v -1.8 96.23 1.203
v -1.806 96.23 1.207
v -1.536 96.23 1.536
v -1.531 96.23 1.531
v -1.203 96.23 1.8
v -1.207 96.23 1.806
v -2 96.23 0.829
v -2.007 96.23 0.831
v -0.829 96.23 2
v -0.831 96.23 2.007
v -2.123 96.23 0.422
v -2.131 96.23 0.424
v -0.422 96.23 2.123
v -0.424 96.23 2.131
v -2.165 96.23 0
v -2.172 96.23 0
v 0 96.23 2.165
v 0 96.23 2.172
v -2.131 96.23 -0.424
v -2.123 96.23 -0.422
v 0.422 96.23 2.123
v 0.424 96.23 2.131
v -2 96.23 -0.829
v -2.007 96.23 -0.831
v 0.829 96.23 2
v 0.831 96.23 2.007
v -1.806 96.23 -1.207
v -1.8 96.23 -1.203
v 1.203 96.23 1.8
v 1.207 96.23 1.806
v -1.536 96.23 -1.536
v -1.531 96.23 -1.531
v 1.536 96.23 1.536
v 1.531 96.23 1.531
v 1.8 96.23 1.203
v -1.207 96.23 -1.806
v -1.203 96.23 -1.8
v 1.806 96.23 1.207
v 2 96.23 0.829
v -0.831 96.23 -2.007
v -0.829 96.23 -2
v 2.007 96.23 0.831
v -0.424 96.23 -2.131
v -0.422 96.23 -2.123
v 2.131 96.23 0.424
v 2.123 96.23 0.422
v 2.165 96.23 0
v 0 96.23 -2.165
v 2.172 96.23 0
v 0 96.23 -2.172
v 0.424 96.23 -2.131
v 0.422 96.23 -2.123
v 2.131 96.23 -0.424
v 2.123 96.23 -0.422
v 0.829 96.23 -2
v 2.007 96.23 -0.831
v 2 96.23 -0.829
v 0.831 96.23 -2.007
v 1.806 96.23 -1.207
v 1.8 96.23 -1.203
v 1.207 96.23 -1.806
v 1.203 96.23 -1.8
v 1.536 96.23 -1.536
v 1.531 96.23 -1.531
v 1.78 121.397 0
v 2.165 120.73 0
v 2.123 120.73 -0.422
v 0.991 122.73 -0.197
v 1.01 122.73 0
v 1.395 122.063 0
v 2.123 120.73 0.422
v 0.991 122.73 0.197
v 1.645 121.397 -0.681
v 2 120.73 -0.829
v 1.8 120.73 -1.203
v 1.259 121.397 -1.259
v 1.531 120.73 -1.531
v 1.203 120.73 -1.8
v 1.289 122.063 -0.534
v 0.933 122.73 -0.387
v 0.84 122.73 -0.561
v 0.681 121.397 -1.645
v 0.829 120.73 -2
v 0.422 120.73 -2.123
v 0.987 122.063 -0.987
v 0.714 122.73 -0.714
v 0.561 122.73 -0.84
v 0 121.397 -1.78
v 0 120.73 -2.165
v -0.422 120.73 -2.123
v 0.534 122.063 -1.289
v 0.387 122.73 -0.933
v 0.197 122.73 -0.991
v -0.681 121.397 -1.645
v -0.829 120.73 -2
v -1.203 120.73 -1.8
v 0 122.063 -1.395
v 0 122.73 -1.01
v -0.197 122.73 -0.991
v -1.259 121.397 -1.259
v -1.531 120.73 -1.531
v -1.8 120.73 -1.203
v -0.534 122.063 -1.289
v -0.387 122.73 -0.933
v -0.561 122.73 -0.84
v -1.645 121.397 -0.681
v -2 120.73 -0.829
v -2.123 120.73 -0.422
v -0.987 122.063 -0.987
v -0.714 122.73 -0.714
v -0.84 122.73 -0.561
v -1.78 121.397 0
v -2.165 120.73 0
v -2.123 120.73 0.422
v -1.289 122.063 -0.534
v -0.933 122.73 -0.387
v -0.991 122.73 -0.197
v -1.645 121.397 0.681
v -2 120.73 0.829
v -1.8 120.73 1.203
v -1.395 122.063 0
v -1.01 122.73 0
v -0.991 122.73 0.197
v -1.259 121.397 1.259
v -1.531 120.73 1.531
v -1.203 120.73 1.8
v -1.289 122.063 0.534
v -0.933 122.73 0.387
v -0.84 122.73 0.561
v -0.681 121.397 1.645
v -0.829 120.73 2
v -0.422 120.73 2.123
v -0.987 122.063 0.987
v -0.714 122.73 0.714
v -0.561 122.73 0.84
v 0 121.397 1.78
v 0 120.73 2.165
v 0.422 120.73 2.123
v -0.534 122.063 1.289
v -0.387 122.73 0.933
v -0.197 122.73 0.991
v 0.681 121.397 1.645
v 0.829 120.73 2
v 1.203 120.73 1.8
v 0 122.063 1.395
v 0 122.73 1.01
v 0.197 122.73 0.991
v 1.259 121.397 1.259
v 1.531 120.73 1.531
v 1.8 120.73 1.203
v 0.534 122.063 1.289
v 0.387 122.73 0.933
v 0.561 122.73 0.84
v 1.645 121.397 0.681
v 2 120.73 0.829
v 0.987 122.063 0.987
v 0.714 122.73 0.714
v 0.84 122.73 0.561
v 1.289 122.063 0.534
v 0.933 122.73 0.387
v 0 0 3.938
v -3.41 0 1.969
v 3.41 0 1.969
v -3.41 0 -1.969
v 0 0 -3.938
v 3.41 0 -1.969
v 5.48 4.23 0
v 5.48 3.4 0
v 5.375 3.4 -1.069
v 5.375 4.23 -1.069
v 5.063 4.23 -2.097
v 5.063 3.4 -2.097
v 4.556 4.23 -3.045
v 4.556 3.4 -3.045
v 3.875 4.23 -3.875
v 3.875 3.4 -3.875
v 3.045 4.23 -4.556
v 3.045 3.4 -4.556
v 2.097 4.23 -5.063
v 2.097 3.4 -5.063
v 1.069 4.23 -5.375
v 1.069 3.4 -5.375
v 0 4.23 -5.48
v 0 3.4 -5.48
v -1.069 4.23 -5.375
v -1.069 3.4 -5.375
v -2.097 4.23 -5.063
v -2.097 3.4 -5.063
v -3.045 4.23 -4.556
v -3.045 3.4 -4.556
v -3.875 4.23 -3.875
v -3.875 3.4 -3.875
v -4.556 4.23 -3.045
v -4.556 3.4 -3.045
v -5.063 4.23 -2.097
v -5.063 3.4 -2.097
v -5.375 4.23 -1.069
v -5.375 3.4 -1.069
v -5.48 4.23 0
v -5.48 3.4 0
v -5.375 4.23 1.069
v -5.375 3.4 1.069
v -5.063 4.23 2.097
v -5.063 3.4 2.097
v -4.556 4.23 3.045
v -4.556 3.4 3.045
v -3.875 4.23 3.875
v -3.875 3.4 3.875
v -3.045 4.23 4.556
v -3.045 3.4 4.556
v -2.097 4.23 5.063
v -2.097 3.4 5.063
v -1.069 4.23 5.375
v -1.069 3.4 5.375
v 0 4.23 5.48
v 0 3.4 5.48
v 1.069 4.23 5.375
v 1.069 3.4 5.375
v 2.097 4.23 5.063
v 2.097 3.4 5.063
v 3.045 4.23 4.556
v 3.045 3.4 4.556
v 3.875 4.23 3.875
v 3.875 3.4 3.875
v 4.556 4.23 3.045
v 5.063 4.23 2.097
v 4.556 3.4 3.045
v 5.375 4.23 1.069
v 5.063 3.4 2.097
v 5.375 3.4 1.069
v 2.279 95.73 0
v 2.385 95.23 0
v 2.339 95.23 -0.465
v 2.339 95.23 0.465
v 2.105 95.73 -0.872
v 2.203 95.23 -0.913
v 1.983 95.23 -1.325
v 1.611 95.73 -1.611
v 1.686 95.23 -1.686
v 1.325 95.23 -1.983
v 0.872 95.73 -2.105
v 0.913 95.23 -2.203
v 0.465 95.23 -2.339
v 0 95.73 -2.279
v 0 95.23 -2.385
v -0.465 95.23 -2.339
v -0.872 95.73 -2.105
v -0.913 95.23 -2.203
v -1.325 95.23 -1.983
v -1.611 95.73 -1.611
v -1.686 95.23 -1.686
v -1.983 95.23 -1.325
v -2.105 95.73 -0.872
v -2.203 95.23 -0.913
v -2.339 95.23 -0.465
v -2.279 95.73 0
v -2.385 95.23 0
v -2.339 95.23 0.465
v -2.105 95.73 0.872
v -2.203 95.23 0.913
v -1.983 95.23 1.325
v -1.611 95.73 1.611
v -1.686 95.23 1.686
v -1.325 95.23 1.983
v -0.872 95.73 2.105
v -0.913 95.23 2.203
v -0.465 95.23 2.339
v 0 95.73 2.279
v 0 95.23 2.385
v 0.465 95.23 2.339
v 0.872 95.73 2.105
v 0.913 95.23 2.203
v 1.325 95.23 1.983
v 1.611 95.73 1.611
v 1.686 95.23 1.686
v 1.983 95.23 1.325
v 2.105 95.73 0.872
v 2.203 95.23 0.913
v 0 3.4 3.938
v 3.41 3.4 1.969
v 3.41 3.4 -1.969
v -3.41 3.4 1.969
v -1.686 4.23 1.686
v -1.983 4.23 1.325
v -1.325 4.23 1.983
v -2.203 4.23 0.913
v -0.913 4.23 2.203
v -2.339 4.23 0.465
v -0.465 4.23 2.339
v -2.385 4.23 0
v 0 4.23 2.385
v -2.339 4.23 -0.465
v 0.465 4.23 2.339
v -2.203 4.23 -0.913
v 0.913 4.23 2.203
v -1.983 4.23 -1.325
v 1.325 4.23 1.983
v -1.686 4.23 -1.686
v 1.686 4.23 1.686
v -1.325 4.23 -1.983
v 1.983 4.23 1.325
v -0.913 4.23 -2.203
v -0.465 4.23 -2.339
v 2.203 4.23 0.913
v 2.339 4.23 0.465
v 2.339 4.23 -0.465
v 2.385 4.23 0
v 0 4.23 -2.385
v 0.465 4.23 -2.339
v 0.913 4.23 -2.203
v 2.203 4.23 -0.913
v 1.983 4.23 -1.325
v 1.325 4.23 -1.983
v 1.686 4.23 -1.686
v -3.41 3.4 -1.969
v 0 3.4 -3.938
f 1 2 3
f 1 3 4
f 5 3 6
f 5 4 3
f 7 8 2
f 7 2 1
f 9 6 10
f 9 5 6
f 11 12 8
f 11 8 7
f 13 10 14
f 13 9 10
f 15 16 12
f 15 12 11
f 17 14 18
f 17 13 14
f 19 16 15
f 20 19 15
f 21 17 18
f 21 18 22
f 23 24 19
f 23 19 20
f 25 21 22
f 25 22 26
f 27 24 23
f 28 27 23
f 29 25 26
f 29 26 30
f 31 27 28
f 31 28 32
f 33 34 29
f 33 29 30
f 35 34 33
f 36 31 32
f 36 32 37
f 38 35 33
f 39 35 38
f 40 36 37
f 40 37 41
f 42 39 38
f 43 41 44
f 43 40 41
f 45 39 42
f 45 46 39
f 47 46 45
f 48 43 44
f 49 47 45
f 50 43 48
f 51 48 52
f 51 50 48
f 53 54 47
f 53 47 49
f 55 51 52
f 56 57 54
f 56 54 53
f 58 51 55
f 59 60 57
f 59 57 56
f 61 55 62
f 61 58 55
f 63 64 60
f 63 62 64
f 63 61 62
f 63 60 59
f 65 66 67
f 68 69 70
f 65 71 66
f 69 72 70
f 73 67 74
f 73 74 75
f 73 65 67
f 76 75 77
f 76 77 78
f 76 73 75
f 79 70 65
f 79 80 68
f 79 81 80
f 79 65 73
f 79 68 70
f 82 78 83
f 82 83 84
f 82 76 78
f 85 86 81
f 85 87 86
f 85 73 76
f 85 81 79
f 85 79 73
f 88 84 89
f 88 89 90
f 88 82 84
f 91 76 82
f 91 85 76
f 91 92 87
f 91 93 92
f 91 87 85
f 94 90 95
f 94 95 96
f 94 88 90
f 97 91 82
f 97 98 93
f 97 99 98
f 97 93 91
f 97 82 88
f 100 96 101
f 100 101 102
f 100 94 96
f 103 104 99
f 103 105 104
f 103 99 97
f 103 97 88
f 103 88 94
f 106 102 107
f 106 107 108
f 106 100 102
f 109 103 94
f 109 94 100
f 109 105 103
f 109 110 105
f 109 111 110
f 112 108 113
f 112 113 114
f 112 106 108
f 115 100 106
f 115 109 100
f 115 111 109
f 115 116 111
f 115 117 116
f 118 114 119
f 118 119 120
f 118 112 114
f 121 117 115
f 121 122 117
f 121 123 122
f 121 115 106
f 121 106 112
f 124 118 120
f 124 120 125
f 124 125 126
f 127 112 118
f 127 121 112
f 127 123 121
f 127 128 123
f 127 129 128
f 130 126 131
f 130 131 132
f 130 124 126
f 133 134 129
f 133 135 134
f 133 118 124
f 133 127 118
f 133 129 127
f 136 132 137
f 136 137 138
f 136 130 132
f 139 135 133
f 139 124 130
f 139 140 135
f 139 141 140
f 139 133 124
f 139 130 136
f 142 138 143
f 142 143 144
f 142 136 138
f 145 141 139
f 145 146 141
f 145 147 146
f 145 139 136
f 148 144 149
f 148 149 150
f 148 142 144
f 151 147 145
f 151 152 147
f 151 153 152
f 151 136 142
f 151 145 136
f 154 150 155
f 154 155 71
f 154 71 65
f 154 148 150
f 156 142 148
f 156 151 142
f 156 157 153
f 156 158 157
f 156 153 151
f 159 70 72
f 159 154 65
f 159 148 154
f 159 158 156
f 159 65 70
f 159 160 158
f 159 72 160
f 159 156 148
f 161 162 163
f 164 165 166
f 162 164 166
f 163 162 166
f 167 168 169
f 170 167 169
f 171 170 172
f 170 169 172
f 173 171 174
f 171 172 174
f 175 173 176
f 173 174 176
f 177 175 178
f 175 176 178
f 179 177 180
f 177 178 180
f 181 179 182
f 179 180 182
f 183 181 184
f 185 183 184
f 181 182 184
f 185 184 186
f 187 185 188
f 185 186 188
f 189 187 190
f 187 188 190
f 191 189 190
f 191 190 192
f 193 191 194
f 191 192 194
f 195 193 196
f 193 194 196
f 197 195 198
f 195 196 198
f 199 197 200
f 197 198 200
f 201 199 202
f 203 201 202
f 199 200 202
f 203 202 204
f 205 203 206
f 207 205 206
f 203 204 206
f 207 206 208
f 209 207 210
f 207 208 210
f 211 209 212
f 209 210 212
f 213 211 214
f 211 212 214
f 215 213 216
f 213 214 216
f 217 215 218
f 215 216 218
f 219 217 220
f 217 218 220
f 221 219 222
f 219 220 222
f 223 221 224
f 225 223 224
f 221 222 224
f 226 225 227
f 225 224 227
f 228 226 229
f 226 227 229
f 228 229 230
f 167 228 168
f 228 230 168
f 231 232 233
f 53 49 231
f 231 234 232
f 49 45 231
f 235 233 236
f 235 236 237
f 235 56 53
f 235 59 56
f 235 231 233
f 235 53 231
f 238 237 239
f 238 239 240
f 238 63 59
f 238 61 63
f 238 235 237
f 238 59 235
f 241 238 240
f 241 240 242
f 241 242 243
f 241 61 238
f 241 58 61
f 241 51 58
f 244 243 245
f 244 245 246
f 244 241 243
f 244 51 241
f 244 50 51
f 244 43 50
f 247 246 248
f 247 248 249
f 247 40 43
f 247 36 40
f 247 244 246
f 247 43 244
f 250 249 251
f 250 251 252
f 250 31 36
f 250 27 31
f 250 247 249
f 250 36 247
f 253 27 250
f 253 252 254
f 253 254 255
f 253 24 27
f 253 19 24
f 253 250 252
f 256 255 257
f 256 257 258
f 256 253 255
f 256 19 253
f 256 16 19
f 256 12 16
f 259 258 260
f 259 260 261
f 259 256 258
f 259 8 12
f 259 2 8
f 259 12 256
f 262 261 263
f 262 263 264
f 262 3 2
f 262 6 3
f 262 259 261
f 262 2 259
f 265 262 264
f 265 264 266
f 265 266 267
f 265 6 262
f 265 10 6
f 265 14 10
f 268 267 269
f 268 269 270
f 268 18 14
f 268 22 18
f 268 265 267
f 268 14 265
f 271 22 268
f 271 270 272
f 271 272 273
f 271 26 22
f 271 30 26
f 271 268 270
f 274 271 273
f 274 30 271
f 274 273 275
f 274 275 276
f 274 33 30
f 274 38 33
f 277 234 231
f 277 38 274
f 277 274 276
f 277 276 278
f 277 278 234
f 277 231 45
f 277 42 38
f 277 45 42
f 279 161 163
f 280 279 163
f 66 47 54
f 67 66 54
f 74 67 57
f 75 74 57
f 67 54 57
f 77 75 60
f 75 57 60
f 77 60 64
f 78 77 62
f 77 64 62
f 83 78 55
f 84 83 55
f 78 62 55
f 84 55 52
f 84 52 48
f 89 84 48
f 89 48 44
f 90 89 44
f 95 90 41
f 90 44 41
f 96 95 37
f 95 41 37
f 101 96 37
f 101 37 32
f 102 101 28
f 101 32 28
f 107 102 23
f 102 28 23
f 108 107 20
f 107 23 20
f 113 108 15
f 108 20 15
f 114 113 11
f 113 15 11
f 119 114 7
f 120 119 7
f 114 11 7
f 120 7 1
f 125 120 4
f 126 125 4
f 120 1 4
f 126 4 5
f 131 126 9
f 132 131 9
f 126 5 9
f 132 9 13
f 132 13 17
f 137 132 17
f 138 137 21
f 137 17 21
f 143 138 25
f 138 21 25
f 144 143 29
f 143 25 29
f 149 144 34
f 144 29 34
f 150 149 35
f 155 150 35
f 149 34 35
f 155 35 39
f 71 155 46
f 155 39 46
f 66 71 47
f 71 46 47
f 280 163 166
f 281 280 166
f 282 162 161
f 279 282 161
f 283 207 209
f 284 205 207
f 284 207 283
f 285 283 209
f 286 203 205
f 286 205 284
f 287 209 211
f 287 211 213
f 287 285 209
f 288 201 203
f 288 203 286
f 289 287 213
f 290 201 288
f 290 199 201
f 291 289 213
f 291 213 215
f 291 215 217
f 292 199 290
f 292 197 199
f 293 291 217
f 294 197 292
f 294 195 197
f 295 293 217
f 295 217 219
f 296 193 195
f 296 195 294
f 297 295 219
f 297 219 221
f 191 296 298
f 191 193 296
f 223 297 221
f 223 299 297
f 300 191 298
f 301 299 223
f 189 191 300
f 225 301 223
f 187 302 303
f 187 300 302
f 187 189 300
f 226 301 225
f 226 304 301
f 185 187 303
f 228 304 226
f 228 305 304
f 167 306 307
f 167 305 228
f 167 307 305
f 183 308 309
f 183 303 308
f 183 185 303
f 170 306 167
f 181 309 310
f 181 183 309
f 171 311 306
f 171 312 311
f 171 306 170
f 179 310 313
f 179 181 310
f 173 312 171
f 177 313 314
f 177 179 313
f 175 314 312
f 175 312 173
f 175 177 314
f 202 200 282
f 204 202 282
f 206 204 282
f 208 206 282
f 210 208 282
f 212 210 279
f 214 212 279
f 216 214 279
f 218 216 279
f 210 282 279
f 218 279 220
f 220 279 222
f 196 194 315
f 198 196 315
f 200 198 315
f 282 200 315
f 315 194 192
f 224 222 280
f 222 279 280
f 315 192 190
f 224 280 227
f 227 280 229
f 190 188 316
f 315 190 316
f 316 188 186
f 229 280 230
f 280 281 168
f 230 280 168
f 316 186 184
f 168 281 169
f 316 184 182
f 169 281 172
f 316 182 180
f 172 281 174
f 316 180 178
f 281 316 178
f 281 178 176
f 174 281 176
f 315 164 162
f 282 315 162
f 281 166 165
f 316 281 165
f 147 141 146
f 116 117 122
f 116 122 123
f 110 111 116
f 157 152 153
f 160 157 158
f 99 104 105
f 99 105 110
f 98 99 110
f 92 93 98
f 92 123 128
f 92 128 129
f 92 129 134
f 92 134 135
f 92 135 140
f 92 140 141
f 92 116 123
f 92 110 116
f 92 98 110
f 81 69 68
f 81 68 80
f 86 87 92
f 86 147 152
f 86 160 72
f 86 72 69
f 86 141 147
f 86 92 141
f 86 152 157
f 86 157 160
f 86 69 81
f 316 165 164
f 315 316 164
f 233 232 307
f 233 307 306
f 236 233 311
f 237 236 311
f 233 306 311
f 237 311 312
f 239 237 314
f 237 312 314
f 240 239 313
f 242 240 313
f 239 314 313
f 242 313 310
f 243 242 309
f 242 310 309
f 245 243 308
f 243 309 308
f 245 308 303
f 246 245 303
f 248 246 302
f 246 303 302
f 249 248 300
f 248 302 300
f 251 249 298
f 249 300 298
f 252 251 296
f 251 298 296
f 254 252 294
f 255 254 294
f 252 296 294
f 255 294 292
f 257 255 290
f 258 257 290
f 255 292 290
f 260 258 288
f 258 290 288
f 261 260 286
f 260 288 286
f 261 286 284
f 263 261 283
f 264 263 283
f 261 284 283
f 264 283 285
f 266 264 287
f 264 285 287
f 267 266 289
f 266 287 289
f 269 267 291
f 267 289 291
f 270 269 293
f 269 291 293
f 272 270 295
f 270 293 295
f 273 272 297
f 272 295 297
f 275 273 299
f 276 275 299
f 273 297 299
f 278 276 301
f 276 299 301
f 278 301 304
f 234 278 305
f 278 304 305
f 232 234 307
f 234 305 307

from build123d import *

# Parameters (mm, degrees)
BOSS_EXTRUDE1_DEPTH = 3.4
SKETCH2_R           = 5.48
BOSS_EXTRUDE2_DEPTH = 0.83
SKETCH3_R           = 2.385
BOSS_EXTRUDE3_DEPTH = 92
SKETCH4_R           = 2.165
BOSS_EXTRUDE4_DEPTH = 26.5
CHAMFER1_SIZE       = 2
CHAMFER1_SIZE2      = 1.154700538
CHAMFER2_SIZE       = 1
CHAMFER2_SIZE2      = 0.212556562


with BuildPart() as part:
    # Sketch1 → Boss-Extrude1 (new body)
    with BuildSketch(Plane(origin=(0, 0, 0), x_dir=(1, 0, 0), z_dir=(0, 1, 0))):
        Polygon((0, -3.937528836), (3.41, -1.968764418), (3.41, 1.968764418), (0, 3.937528836), (-3.41, 1.968764418), (-3.41, -1.968764418), align=None)
    extrude(amount=BOSS_EXTRUDE1_DEPTH)

    # Sketch2 → Boss-Extrude2 (add)
    with BuildSketch(Plane(origin=(0, 3.4, 0), x_dir=(1, 0, 0), z_dir=(0, 1, 0))):
        Circle(SKETCH2_R)
    extrude(amount=BOSS_EXTRUDE2_DEPTH)

    # Sketch3 → Boss-Extrude3 (add)
    with BuildSketch(Plane(origin=(0, 4.23, 0), x_dir=(1, 0, 0), z_dir=(0, 1, 0))):
        Circle(SKETCH3_R)
    extrude(amount=BOSS_EXTRUDE3_DEPTH)

    # Sketch4 → Boss-Extrude4 (add)
    with BuildSketch(Plane(origin=(0, 96.23, 0), x_dir=(1, 0, 0), z_dir=(0, 1, 0))):
        Circle(SKETCH4_R)
    extrude(amount=BOSS_EXTRUDE4_DEPTH)

    # Chamfer1
    chamfer1_edges = [part.edges().sort_by_distance(p)[0] for p in [
        (-2.165, 122.73, 0),
    ]]
    chamfer1_side = [part.faces().sort_by_distance(p)[0] for p in [
        (-2.165, 109.48, 0),
    ]]
    chamfer(chamfer1_edges, length=CHAMFER1_SIZE, length2=CHAMFER1_SIZE2, reference=chamfer1_side[0])

    # Chamfer2
    chamfer2_edges = [part.edges().sort_by_distance(p)[0] for p in [
        (-2.385, 96.23, 0),
    ]]
    chamfer2_side = [part.faces().sort_by_distance(p)[0] for p in [
        (-2.385, 50.23, 0),
    ]]
    chamfer(chamfer2_edges, length=CHAMFER2_SIZE, length2=CHAMFER2_SIZE2, reference=chamfer2_side[0])


solid = part.part
